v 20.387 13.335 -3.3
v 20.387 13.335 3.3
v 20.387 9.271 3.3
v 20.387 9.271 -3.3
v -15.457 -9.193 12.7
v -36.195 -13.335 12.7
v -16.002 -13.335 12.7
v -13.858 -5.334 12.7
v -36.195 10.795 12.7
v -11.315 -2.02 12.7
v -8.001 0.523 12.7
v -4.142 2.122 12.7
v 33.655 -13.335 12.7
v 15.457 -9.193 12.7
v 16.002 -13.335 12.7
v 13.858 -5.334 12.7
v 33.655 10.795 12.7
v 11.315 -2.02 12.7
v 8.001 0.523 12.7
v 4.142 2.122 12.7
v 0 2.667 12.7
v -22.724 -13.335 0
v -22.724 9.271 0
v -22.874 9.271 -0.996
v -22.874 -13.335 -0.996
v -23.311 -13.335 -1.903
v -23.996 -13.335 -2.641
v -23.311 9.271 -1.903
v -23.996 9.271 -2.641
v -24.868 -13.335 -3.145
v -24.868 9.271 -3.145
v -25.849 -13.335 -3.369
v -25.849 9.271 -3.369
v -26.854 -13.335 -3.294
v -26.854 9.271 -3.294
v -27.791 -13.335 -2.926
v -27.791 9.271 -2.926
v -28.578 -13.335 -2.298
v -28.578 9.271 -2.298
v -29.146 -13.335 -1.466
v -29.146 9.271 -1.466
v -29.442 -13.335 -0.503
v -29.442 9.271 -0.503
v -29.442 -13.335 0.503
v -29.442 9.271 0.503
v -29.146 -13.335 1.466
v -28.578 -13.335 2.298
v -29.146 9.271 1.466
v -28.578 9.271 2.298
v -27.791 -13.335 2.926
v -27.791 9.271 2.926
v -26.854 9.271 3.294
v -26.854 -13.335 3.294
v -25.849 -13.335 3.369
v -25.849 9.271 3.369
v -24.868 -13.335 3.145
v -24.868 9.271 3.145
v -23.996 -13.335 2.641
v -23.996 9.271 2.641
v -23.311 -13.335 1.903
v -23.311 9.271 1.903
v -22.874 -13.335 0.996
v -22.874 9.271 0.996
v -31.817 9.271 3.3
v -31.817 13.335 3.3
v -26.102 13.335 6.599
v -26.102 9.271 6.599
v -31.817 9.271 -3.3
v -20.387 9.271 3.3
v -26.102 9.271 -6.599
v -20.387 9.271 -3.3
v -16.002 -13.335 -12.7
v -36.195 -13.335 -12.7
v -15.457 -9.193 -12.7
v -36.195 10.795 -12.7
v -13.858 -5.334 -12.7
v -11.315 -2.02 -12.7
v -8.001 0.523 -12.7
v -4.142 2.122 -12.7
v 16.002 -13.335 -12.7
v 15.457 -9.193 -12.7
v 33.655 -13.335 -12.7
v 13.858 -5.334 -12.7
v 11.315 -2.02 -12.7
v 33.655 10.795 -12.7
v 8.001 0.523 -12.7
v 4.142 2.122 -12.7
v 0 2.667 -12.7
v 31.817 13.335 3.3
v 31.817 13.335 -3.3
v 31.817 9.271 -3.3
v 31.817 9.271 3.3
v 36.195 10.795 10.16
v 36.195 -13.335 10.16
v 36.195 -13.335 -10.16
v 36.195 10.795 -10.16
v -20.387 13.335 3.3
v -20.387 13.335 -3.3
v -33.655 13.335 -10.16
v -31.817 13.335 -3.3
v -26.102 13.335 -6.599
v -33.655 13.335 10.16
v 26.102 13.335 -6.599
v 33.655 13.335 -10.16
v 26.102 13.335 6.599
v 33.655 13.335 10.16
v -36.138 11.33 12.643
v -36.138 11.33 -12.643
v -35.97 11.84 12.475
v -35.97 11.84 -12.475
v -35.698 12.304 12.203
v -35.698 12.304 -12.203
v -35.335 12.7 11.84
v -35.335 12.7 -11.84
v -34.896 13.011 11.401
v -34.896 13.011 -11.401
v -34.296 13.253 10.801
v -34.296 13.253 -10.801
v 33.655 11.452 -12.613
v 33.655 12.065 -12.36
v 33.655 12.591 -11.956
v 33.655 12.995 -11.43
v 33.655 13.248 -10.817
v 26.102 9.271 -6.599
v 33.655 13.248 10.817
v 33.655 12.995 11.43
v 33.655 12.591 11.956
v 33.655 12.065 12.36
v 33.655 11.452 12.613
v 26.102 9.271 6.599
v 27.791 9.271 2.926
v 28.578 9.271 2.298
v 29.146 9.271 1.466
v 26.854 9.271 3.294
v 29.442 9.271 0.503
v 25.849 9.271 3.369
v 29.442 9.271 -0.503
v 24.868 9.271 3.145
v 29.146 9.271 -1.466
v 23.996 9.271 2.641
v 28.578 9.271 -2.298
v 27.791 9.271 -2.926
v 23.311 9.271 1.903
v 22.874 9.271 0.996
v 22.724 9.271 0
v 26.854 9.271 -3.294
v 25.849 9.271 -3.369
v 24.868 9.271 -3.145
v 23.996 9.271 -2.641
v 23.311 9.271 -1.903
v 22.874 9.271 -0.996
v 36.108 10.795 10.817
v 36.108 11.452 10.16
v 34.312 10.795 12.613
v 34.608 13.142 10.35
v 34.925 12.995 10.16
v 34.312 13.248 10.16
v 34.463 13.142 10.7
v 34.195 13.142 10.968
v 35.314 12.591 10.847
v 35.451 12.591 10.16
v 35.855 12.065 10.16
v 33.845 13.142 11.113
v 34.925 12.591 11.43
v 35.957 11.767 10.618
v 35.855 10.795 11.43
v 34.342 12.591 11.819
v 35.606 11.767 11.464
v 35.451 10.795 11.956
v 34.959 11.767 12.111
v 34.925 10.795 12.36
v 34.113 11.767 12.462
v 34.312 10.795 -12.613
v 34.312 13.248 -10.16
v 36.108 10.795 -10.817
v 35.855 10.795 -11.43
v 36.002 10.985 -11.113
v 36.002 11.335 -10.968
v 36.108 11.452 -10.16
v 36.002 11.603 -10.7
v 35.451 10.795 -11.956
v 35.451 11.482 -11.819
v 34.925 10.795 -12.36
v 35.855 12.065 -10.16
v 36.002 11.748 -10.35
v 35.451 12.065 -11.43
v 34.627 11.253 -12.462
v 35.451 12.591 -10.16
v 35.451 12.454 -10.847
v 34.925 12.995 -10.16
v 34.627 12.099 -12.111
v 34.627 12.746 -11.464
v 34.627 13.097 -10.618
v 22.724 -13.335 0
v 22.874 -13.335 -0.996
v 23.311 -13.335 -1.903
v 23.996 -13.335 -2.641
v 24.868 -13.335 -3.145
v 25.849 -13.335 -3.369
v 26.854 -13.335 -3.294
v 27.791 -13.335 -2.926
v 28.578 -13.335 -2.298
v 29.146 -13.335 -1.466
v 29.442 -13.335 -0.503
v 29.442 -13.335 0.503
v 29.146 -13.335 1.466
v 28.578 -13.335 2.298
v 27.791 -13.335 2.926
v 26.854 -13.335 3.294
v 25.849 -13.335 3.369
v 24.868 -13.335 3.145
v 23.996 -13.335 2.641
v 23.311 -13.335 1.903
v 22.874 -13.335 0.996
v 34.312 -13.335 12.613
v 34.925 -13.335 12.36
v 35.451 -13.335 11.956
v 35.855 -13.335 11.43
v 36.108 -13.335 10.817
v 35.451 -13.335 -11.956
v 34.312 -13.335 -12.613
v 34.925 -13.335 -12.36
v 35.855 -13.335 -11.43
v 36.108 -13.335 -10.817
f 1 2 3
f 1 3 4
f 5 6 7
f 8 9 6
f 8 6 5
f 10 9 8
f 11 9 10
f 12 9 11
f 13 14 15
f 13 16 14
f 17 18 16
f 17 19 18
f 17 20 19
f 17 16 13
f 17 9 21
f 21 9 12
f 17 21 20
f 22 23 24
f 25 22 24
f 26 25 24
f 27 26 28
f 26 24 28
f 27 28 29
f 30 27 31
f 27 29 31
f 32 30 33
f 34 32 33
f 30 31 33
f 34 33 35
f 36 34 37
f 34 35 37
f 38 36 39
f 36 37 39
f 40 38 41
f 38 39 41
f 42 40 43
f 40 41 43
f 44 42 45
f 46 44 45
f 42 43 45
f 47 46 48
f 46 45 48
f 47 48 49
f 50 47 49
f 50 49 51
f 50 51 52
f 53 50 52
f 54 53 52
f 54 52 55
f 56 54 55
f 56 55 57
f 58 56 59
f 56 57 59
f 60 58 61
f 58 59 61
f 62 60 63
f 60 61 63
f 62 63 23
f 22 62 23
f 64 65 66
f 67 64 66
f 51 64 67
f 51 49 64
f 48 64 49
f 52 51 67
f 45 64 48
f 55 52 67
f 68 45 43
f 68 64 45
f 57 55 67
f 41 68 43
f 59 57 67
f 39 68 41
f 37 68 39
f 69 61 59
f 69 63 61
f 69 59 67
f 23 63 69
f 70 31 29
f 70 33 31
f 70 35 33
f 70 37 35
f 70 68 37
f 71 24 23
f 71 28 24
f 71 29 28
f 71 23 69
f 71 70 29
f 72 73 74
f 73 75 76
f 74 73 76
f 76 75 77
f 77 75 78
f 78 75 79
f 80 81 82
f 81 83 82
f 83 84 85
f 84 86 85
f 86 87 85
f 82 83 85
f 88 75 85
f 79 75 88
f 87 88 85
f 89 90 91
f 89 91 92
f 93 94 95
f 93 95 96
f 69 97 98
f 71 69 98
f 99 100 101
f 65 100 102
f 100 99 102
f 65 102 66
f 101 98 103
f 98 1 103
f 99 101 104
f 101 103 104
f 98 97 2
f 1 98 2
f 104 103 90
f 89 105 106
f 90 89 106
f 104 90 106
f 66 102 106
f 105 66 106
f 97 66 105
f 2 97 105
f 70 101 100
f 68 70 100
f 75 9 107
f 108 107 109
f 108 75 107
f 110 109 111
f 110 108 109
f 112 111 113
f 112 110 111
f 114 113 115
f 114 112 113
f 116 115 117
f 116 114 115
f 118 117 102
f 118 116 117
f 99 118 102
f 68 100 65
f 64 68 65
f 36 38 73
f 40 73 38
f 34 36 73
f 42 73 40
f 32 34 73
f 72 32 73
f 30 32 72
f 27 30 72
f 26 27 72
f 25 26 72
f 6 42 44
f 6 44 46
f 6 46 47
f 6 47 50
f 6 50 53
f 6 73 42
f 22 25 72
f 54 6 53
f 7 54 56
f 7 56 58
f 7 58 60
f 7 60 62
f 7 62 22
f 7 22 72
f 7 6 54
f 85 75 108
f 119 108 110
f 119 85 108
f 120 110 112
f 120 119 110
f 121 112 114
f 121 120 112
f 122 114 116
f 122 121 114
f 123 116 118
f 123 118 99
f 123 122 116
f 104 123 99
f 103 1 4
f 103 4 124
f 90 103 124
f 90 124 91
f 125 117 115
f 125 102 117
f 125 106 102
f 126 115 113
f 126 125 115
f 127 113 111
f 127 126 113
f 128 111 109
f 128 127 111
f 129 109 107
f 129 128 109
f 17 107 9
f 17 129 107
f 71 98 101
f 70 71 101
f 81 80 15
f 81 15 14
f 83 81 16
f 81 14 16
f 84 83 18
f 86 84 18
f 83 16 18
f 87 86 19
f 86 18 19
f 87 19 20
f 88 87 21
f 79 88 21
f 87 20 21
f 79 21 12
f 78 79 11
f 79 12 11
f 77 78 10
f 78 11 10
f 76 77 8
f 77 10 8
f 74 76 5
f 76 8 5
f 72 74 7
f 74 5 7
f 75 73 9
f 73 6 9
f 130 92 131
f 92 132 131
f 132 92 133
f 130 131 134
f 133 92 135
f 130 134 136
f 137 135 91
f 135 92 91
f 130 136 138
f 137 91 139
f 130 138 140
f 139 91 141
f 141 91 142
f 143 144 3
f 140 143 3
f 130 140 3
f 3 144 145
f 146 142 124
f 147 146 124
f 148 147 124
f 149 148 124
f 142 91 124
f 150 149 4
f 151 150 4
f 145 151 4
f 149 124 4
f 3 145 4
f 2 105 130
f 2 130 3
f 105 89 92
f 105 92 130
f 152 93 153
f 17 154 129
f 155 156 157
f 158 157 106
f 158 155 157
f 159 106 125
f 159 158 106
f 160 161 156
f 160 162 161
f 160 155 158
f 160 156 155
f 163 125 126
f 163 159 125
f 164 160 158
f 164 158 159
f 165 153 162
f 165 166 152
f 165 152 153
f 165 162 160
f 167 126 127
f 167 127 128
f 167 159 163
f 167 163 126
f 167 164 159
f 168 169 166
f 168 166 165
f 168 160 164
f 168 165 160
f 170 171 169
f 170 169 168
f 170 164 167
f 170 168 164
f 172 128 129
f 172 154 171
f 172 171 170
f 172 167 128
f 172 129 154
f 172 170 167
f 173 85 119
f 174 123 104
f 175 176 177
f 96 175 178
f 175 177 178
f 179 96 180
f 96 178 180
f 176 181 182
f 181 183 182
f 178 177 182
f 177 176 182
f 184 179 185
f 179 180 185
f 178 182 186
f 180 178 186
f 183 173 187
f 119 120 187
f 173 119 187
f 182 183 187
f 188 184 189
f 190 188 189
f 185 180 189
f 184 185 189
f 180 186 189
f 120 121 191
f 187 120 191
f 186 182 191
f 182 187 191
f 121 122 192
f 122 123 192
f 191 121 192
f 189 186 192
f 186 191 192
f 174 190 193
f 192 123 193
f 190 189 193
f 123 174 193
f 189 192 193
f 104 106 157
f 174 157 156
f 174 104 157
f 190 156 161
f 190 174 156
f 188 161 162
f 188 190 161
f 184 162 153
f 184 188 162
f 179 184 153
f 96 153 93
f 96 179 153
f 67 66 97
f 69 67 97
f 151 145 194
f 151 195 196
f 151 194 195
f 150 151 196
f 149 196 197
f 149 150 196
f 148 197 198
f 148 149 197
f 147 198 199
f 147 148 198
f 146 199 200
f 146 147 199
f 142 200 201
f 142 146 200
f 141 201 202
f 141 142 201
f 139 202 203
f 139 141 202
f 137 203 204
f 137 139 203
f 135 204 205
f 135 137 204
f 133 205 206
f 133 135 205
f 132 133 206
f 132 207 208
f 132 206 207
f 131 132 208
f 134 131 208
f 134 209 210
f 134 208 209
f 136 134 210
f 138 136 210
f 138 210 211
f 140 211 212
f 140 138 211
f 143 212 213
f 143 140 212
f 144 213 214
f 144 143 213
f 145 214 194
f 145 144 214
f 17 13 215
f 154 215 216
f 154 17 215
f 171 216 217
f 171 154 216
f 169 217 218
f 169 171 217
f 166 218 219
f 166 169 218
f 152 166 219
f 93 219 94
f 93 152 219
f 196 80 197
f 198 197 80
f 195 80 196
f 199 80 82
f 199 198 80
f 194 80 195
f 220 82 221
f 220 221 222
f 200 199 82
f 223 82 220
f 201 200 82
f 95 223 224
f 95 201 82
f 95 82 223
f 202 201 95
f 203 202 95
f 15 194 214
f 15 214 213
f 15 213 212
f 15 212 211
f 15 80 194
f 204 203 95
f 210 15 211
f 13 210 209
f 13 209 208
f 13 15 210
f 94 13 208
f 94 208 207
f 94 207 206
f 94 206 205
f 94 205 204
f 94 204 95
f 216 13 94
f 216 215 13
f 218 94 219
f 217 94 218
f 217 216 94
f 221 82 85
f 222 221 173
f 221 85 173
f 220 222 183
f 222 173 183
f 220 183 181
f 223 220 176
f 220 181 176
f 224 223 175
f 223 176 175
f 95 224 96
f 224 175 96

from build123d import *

# Parameters (mm, degrees)
SKETCH3_W           = 72.39
SKETCH3_H           = 26.67
BOSS_EXTRUDE1_DEPTH = 12.7
SKETCH4_R           = 16.002
CUT_EXTRUDE1_DEPTH  = 26.4
SKETCH7_R           = 3.3782
CUT_EXTRUDE2_DEPTH  = 15.875
FILLET1_R           = 2.54
CUT_EXTRUDE3_DEPTH  = 4.064


with BuildPart() as part:
    # Sketch3 → Boss-Extrude1 (new body, symmetric)
    with BuildSketch(Plane.XY):
        Rectangle(SKETCH3_W, SKETCH3_H)
    extrude(amount=BOSS_EXTRUDE1_DEPTH, both=True)

    # Sketch4 → Cut-Extrude1 (cut, through all)
    with BuildSketch(Plane.XY.offset(12.7)):
        with Locations((0, -13.335)):
            Circle(SKETCH4_R)
    extrude(amount=-CUT_EXTRUDE1_DEPTH, mode=Mode.SUBTRACT)

    # Sketch7 → Cut-Extrude2 (cut, symmetric)
    with BuildSketch(Plane(origin=(0, 0, 0), x_dir=(1, 0, 0), z_dir=(0, 1, 0))):
        with Locations((-26.101920205, 0)):
            Circle(SKETCH7_R)
    cut_extrude2 = extrude(amount=CUT_EXTRUDE2_DEPTH, both=True, mode=Mode.SUBTRACT)

    # Mirror1: Cut-Extrude2 across plane
    add(cut_extrude2.mirror(Plane(origin=(0, 0, 0), x_dir=(0, 0, 1), z_dir=(1, 0, 0))), mode=Mode.SUBTRACT)

    # Fillet1
    fillet1_edges = [part.edges().sort_by_distance(p)[0] for p in [
        (36.195, 0, 12.7),
        (0, 13.335, -12.7),
        (36.195, 0, -12.7),
        (-36.195, 13.335, 0),
        (36.195, 13.335, 0),
        (0, 13.335, 12.7),
    ]]
    fillet(fillet1_edges, radius=FILLET1_R)

    # Sketch8 → Cut-Extrude3 (cut)
    with BuildSketch(Plane(origin=(0, 13.335, 0), x_dir=(1, 0, 0), z_dir=(0, 1, 0))):
        Polygon((-26.101920205, -6.599113577), (-20.386920205, -3.299556788), (-20.386920205, 3.299556788), (-26.101920205, 6.599113577), (-31.816920205, 3.299556788), (-31.816920205, -3.299556788), align=None)
    cut_extrude3 = extrude(amount=-CUT_EXTRUDE3_DEPTH, mode=Mode.SUBTRACT)

    # Mirror2: Cut-Extrude3 across plane
    add(cut_extrude3.mirror(Plane(origin=(0, 0, 0), x_dir=(0, 0, 1), z_dir=(1, 0, 0))), mode=Mode.SUBTRACT)


solid = part.part
